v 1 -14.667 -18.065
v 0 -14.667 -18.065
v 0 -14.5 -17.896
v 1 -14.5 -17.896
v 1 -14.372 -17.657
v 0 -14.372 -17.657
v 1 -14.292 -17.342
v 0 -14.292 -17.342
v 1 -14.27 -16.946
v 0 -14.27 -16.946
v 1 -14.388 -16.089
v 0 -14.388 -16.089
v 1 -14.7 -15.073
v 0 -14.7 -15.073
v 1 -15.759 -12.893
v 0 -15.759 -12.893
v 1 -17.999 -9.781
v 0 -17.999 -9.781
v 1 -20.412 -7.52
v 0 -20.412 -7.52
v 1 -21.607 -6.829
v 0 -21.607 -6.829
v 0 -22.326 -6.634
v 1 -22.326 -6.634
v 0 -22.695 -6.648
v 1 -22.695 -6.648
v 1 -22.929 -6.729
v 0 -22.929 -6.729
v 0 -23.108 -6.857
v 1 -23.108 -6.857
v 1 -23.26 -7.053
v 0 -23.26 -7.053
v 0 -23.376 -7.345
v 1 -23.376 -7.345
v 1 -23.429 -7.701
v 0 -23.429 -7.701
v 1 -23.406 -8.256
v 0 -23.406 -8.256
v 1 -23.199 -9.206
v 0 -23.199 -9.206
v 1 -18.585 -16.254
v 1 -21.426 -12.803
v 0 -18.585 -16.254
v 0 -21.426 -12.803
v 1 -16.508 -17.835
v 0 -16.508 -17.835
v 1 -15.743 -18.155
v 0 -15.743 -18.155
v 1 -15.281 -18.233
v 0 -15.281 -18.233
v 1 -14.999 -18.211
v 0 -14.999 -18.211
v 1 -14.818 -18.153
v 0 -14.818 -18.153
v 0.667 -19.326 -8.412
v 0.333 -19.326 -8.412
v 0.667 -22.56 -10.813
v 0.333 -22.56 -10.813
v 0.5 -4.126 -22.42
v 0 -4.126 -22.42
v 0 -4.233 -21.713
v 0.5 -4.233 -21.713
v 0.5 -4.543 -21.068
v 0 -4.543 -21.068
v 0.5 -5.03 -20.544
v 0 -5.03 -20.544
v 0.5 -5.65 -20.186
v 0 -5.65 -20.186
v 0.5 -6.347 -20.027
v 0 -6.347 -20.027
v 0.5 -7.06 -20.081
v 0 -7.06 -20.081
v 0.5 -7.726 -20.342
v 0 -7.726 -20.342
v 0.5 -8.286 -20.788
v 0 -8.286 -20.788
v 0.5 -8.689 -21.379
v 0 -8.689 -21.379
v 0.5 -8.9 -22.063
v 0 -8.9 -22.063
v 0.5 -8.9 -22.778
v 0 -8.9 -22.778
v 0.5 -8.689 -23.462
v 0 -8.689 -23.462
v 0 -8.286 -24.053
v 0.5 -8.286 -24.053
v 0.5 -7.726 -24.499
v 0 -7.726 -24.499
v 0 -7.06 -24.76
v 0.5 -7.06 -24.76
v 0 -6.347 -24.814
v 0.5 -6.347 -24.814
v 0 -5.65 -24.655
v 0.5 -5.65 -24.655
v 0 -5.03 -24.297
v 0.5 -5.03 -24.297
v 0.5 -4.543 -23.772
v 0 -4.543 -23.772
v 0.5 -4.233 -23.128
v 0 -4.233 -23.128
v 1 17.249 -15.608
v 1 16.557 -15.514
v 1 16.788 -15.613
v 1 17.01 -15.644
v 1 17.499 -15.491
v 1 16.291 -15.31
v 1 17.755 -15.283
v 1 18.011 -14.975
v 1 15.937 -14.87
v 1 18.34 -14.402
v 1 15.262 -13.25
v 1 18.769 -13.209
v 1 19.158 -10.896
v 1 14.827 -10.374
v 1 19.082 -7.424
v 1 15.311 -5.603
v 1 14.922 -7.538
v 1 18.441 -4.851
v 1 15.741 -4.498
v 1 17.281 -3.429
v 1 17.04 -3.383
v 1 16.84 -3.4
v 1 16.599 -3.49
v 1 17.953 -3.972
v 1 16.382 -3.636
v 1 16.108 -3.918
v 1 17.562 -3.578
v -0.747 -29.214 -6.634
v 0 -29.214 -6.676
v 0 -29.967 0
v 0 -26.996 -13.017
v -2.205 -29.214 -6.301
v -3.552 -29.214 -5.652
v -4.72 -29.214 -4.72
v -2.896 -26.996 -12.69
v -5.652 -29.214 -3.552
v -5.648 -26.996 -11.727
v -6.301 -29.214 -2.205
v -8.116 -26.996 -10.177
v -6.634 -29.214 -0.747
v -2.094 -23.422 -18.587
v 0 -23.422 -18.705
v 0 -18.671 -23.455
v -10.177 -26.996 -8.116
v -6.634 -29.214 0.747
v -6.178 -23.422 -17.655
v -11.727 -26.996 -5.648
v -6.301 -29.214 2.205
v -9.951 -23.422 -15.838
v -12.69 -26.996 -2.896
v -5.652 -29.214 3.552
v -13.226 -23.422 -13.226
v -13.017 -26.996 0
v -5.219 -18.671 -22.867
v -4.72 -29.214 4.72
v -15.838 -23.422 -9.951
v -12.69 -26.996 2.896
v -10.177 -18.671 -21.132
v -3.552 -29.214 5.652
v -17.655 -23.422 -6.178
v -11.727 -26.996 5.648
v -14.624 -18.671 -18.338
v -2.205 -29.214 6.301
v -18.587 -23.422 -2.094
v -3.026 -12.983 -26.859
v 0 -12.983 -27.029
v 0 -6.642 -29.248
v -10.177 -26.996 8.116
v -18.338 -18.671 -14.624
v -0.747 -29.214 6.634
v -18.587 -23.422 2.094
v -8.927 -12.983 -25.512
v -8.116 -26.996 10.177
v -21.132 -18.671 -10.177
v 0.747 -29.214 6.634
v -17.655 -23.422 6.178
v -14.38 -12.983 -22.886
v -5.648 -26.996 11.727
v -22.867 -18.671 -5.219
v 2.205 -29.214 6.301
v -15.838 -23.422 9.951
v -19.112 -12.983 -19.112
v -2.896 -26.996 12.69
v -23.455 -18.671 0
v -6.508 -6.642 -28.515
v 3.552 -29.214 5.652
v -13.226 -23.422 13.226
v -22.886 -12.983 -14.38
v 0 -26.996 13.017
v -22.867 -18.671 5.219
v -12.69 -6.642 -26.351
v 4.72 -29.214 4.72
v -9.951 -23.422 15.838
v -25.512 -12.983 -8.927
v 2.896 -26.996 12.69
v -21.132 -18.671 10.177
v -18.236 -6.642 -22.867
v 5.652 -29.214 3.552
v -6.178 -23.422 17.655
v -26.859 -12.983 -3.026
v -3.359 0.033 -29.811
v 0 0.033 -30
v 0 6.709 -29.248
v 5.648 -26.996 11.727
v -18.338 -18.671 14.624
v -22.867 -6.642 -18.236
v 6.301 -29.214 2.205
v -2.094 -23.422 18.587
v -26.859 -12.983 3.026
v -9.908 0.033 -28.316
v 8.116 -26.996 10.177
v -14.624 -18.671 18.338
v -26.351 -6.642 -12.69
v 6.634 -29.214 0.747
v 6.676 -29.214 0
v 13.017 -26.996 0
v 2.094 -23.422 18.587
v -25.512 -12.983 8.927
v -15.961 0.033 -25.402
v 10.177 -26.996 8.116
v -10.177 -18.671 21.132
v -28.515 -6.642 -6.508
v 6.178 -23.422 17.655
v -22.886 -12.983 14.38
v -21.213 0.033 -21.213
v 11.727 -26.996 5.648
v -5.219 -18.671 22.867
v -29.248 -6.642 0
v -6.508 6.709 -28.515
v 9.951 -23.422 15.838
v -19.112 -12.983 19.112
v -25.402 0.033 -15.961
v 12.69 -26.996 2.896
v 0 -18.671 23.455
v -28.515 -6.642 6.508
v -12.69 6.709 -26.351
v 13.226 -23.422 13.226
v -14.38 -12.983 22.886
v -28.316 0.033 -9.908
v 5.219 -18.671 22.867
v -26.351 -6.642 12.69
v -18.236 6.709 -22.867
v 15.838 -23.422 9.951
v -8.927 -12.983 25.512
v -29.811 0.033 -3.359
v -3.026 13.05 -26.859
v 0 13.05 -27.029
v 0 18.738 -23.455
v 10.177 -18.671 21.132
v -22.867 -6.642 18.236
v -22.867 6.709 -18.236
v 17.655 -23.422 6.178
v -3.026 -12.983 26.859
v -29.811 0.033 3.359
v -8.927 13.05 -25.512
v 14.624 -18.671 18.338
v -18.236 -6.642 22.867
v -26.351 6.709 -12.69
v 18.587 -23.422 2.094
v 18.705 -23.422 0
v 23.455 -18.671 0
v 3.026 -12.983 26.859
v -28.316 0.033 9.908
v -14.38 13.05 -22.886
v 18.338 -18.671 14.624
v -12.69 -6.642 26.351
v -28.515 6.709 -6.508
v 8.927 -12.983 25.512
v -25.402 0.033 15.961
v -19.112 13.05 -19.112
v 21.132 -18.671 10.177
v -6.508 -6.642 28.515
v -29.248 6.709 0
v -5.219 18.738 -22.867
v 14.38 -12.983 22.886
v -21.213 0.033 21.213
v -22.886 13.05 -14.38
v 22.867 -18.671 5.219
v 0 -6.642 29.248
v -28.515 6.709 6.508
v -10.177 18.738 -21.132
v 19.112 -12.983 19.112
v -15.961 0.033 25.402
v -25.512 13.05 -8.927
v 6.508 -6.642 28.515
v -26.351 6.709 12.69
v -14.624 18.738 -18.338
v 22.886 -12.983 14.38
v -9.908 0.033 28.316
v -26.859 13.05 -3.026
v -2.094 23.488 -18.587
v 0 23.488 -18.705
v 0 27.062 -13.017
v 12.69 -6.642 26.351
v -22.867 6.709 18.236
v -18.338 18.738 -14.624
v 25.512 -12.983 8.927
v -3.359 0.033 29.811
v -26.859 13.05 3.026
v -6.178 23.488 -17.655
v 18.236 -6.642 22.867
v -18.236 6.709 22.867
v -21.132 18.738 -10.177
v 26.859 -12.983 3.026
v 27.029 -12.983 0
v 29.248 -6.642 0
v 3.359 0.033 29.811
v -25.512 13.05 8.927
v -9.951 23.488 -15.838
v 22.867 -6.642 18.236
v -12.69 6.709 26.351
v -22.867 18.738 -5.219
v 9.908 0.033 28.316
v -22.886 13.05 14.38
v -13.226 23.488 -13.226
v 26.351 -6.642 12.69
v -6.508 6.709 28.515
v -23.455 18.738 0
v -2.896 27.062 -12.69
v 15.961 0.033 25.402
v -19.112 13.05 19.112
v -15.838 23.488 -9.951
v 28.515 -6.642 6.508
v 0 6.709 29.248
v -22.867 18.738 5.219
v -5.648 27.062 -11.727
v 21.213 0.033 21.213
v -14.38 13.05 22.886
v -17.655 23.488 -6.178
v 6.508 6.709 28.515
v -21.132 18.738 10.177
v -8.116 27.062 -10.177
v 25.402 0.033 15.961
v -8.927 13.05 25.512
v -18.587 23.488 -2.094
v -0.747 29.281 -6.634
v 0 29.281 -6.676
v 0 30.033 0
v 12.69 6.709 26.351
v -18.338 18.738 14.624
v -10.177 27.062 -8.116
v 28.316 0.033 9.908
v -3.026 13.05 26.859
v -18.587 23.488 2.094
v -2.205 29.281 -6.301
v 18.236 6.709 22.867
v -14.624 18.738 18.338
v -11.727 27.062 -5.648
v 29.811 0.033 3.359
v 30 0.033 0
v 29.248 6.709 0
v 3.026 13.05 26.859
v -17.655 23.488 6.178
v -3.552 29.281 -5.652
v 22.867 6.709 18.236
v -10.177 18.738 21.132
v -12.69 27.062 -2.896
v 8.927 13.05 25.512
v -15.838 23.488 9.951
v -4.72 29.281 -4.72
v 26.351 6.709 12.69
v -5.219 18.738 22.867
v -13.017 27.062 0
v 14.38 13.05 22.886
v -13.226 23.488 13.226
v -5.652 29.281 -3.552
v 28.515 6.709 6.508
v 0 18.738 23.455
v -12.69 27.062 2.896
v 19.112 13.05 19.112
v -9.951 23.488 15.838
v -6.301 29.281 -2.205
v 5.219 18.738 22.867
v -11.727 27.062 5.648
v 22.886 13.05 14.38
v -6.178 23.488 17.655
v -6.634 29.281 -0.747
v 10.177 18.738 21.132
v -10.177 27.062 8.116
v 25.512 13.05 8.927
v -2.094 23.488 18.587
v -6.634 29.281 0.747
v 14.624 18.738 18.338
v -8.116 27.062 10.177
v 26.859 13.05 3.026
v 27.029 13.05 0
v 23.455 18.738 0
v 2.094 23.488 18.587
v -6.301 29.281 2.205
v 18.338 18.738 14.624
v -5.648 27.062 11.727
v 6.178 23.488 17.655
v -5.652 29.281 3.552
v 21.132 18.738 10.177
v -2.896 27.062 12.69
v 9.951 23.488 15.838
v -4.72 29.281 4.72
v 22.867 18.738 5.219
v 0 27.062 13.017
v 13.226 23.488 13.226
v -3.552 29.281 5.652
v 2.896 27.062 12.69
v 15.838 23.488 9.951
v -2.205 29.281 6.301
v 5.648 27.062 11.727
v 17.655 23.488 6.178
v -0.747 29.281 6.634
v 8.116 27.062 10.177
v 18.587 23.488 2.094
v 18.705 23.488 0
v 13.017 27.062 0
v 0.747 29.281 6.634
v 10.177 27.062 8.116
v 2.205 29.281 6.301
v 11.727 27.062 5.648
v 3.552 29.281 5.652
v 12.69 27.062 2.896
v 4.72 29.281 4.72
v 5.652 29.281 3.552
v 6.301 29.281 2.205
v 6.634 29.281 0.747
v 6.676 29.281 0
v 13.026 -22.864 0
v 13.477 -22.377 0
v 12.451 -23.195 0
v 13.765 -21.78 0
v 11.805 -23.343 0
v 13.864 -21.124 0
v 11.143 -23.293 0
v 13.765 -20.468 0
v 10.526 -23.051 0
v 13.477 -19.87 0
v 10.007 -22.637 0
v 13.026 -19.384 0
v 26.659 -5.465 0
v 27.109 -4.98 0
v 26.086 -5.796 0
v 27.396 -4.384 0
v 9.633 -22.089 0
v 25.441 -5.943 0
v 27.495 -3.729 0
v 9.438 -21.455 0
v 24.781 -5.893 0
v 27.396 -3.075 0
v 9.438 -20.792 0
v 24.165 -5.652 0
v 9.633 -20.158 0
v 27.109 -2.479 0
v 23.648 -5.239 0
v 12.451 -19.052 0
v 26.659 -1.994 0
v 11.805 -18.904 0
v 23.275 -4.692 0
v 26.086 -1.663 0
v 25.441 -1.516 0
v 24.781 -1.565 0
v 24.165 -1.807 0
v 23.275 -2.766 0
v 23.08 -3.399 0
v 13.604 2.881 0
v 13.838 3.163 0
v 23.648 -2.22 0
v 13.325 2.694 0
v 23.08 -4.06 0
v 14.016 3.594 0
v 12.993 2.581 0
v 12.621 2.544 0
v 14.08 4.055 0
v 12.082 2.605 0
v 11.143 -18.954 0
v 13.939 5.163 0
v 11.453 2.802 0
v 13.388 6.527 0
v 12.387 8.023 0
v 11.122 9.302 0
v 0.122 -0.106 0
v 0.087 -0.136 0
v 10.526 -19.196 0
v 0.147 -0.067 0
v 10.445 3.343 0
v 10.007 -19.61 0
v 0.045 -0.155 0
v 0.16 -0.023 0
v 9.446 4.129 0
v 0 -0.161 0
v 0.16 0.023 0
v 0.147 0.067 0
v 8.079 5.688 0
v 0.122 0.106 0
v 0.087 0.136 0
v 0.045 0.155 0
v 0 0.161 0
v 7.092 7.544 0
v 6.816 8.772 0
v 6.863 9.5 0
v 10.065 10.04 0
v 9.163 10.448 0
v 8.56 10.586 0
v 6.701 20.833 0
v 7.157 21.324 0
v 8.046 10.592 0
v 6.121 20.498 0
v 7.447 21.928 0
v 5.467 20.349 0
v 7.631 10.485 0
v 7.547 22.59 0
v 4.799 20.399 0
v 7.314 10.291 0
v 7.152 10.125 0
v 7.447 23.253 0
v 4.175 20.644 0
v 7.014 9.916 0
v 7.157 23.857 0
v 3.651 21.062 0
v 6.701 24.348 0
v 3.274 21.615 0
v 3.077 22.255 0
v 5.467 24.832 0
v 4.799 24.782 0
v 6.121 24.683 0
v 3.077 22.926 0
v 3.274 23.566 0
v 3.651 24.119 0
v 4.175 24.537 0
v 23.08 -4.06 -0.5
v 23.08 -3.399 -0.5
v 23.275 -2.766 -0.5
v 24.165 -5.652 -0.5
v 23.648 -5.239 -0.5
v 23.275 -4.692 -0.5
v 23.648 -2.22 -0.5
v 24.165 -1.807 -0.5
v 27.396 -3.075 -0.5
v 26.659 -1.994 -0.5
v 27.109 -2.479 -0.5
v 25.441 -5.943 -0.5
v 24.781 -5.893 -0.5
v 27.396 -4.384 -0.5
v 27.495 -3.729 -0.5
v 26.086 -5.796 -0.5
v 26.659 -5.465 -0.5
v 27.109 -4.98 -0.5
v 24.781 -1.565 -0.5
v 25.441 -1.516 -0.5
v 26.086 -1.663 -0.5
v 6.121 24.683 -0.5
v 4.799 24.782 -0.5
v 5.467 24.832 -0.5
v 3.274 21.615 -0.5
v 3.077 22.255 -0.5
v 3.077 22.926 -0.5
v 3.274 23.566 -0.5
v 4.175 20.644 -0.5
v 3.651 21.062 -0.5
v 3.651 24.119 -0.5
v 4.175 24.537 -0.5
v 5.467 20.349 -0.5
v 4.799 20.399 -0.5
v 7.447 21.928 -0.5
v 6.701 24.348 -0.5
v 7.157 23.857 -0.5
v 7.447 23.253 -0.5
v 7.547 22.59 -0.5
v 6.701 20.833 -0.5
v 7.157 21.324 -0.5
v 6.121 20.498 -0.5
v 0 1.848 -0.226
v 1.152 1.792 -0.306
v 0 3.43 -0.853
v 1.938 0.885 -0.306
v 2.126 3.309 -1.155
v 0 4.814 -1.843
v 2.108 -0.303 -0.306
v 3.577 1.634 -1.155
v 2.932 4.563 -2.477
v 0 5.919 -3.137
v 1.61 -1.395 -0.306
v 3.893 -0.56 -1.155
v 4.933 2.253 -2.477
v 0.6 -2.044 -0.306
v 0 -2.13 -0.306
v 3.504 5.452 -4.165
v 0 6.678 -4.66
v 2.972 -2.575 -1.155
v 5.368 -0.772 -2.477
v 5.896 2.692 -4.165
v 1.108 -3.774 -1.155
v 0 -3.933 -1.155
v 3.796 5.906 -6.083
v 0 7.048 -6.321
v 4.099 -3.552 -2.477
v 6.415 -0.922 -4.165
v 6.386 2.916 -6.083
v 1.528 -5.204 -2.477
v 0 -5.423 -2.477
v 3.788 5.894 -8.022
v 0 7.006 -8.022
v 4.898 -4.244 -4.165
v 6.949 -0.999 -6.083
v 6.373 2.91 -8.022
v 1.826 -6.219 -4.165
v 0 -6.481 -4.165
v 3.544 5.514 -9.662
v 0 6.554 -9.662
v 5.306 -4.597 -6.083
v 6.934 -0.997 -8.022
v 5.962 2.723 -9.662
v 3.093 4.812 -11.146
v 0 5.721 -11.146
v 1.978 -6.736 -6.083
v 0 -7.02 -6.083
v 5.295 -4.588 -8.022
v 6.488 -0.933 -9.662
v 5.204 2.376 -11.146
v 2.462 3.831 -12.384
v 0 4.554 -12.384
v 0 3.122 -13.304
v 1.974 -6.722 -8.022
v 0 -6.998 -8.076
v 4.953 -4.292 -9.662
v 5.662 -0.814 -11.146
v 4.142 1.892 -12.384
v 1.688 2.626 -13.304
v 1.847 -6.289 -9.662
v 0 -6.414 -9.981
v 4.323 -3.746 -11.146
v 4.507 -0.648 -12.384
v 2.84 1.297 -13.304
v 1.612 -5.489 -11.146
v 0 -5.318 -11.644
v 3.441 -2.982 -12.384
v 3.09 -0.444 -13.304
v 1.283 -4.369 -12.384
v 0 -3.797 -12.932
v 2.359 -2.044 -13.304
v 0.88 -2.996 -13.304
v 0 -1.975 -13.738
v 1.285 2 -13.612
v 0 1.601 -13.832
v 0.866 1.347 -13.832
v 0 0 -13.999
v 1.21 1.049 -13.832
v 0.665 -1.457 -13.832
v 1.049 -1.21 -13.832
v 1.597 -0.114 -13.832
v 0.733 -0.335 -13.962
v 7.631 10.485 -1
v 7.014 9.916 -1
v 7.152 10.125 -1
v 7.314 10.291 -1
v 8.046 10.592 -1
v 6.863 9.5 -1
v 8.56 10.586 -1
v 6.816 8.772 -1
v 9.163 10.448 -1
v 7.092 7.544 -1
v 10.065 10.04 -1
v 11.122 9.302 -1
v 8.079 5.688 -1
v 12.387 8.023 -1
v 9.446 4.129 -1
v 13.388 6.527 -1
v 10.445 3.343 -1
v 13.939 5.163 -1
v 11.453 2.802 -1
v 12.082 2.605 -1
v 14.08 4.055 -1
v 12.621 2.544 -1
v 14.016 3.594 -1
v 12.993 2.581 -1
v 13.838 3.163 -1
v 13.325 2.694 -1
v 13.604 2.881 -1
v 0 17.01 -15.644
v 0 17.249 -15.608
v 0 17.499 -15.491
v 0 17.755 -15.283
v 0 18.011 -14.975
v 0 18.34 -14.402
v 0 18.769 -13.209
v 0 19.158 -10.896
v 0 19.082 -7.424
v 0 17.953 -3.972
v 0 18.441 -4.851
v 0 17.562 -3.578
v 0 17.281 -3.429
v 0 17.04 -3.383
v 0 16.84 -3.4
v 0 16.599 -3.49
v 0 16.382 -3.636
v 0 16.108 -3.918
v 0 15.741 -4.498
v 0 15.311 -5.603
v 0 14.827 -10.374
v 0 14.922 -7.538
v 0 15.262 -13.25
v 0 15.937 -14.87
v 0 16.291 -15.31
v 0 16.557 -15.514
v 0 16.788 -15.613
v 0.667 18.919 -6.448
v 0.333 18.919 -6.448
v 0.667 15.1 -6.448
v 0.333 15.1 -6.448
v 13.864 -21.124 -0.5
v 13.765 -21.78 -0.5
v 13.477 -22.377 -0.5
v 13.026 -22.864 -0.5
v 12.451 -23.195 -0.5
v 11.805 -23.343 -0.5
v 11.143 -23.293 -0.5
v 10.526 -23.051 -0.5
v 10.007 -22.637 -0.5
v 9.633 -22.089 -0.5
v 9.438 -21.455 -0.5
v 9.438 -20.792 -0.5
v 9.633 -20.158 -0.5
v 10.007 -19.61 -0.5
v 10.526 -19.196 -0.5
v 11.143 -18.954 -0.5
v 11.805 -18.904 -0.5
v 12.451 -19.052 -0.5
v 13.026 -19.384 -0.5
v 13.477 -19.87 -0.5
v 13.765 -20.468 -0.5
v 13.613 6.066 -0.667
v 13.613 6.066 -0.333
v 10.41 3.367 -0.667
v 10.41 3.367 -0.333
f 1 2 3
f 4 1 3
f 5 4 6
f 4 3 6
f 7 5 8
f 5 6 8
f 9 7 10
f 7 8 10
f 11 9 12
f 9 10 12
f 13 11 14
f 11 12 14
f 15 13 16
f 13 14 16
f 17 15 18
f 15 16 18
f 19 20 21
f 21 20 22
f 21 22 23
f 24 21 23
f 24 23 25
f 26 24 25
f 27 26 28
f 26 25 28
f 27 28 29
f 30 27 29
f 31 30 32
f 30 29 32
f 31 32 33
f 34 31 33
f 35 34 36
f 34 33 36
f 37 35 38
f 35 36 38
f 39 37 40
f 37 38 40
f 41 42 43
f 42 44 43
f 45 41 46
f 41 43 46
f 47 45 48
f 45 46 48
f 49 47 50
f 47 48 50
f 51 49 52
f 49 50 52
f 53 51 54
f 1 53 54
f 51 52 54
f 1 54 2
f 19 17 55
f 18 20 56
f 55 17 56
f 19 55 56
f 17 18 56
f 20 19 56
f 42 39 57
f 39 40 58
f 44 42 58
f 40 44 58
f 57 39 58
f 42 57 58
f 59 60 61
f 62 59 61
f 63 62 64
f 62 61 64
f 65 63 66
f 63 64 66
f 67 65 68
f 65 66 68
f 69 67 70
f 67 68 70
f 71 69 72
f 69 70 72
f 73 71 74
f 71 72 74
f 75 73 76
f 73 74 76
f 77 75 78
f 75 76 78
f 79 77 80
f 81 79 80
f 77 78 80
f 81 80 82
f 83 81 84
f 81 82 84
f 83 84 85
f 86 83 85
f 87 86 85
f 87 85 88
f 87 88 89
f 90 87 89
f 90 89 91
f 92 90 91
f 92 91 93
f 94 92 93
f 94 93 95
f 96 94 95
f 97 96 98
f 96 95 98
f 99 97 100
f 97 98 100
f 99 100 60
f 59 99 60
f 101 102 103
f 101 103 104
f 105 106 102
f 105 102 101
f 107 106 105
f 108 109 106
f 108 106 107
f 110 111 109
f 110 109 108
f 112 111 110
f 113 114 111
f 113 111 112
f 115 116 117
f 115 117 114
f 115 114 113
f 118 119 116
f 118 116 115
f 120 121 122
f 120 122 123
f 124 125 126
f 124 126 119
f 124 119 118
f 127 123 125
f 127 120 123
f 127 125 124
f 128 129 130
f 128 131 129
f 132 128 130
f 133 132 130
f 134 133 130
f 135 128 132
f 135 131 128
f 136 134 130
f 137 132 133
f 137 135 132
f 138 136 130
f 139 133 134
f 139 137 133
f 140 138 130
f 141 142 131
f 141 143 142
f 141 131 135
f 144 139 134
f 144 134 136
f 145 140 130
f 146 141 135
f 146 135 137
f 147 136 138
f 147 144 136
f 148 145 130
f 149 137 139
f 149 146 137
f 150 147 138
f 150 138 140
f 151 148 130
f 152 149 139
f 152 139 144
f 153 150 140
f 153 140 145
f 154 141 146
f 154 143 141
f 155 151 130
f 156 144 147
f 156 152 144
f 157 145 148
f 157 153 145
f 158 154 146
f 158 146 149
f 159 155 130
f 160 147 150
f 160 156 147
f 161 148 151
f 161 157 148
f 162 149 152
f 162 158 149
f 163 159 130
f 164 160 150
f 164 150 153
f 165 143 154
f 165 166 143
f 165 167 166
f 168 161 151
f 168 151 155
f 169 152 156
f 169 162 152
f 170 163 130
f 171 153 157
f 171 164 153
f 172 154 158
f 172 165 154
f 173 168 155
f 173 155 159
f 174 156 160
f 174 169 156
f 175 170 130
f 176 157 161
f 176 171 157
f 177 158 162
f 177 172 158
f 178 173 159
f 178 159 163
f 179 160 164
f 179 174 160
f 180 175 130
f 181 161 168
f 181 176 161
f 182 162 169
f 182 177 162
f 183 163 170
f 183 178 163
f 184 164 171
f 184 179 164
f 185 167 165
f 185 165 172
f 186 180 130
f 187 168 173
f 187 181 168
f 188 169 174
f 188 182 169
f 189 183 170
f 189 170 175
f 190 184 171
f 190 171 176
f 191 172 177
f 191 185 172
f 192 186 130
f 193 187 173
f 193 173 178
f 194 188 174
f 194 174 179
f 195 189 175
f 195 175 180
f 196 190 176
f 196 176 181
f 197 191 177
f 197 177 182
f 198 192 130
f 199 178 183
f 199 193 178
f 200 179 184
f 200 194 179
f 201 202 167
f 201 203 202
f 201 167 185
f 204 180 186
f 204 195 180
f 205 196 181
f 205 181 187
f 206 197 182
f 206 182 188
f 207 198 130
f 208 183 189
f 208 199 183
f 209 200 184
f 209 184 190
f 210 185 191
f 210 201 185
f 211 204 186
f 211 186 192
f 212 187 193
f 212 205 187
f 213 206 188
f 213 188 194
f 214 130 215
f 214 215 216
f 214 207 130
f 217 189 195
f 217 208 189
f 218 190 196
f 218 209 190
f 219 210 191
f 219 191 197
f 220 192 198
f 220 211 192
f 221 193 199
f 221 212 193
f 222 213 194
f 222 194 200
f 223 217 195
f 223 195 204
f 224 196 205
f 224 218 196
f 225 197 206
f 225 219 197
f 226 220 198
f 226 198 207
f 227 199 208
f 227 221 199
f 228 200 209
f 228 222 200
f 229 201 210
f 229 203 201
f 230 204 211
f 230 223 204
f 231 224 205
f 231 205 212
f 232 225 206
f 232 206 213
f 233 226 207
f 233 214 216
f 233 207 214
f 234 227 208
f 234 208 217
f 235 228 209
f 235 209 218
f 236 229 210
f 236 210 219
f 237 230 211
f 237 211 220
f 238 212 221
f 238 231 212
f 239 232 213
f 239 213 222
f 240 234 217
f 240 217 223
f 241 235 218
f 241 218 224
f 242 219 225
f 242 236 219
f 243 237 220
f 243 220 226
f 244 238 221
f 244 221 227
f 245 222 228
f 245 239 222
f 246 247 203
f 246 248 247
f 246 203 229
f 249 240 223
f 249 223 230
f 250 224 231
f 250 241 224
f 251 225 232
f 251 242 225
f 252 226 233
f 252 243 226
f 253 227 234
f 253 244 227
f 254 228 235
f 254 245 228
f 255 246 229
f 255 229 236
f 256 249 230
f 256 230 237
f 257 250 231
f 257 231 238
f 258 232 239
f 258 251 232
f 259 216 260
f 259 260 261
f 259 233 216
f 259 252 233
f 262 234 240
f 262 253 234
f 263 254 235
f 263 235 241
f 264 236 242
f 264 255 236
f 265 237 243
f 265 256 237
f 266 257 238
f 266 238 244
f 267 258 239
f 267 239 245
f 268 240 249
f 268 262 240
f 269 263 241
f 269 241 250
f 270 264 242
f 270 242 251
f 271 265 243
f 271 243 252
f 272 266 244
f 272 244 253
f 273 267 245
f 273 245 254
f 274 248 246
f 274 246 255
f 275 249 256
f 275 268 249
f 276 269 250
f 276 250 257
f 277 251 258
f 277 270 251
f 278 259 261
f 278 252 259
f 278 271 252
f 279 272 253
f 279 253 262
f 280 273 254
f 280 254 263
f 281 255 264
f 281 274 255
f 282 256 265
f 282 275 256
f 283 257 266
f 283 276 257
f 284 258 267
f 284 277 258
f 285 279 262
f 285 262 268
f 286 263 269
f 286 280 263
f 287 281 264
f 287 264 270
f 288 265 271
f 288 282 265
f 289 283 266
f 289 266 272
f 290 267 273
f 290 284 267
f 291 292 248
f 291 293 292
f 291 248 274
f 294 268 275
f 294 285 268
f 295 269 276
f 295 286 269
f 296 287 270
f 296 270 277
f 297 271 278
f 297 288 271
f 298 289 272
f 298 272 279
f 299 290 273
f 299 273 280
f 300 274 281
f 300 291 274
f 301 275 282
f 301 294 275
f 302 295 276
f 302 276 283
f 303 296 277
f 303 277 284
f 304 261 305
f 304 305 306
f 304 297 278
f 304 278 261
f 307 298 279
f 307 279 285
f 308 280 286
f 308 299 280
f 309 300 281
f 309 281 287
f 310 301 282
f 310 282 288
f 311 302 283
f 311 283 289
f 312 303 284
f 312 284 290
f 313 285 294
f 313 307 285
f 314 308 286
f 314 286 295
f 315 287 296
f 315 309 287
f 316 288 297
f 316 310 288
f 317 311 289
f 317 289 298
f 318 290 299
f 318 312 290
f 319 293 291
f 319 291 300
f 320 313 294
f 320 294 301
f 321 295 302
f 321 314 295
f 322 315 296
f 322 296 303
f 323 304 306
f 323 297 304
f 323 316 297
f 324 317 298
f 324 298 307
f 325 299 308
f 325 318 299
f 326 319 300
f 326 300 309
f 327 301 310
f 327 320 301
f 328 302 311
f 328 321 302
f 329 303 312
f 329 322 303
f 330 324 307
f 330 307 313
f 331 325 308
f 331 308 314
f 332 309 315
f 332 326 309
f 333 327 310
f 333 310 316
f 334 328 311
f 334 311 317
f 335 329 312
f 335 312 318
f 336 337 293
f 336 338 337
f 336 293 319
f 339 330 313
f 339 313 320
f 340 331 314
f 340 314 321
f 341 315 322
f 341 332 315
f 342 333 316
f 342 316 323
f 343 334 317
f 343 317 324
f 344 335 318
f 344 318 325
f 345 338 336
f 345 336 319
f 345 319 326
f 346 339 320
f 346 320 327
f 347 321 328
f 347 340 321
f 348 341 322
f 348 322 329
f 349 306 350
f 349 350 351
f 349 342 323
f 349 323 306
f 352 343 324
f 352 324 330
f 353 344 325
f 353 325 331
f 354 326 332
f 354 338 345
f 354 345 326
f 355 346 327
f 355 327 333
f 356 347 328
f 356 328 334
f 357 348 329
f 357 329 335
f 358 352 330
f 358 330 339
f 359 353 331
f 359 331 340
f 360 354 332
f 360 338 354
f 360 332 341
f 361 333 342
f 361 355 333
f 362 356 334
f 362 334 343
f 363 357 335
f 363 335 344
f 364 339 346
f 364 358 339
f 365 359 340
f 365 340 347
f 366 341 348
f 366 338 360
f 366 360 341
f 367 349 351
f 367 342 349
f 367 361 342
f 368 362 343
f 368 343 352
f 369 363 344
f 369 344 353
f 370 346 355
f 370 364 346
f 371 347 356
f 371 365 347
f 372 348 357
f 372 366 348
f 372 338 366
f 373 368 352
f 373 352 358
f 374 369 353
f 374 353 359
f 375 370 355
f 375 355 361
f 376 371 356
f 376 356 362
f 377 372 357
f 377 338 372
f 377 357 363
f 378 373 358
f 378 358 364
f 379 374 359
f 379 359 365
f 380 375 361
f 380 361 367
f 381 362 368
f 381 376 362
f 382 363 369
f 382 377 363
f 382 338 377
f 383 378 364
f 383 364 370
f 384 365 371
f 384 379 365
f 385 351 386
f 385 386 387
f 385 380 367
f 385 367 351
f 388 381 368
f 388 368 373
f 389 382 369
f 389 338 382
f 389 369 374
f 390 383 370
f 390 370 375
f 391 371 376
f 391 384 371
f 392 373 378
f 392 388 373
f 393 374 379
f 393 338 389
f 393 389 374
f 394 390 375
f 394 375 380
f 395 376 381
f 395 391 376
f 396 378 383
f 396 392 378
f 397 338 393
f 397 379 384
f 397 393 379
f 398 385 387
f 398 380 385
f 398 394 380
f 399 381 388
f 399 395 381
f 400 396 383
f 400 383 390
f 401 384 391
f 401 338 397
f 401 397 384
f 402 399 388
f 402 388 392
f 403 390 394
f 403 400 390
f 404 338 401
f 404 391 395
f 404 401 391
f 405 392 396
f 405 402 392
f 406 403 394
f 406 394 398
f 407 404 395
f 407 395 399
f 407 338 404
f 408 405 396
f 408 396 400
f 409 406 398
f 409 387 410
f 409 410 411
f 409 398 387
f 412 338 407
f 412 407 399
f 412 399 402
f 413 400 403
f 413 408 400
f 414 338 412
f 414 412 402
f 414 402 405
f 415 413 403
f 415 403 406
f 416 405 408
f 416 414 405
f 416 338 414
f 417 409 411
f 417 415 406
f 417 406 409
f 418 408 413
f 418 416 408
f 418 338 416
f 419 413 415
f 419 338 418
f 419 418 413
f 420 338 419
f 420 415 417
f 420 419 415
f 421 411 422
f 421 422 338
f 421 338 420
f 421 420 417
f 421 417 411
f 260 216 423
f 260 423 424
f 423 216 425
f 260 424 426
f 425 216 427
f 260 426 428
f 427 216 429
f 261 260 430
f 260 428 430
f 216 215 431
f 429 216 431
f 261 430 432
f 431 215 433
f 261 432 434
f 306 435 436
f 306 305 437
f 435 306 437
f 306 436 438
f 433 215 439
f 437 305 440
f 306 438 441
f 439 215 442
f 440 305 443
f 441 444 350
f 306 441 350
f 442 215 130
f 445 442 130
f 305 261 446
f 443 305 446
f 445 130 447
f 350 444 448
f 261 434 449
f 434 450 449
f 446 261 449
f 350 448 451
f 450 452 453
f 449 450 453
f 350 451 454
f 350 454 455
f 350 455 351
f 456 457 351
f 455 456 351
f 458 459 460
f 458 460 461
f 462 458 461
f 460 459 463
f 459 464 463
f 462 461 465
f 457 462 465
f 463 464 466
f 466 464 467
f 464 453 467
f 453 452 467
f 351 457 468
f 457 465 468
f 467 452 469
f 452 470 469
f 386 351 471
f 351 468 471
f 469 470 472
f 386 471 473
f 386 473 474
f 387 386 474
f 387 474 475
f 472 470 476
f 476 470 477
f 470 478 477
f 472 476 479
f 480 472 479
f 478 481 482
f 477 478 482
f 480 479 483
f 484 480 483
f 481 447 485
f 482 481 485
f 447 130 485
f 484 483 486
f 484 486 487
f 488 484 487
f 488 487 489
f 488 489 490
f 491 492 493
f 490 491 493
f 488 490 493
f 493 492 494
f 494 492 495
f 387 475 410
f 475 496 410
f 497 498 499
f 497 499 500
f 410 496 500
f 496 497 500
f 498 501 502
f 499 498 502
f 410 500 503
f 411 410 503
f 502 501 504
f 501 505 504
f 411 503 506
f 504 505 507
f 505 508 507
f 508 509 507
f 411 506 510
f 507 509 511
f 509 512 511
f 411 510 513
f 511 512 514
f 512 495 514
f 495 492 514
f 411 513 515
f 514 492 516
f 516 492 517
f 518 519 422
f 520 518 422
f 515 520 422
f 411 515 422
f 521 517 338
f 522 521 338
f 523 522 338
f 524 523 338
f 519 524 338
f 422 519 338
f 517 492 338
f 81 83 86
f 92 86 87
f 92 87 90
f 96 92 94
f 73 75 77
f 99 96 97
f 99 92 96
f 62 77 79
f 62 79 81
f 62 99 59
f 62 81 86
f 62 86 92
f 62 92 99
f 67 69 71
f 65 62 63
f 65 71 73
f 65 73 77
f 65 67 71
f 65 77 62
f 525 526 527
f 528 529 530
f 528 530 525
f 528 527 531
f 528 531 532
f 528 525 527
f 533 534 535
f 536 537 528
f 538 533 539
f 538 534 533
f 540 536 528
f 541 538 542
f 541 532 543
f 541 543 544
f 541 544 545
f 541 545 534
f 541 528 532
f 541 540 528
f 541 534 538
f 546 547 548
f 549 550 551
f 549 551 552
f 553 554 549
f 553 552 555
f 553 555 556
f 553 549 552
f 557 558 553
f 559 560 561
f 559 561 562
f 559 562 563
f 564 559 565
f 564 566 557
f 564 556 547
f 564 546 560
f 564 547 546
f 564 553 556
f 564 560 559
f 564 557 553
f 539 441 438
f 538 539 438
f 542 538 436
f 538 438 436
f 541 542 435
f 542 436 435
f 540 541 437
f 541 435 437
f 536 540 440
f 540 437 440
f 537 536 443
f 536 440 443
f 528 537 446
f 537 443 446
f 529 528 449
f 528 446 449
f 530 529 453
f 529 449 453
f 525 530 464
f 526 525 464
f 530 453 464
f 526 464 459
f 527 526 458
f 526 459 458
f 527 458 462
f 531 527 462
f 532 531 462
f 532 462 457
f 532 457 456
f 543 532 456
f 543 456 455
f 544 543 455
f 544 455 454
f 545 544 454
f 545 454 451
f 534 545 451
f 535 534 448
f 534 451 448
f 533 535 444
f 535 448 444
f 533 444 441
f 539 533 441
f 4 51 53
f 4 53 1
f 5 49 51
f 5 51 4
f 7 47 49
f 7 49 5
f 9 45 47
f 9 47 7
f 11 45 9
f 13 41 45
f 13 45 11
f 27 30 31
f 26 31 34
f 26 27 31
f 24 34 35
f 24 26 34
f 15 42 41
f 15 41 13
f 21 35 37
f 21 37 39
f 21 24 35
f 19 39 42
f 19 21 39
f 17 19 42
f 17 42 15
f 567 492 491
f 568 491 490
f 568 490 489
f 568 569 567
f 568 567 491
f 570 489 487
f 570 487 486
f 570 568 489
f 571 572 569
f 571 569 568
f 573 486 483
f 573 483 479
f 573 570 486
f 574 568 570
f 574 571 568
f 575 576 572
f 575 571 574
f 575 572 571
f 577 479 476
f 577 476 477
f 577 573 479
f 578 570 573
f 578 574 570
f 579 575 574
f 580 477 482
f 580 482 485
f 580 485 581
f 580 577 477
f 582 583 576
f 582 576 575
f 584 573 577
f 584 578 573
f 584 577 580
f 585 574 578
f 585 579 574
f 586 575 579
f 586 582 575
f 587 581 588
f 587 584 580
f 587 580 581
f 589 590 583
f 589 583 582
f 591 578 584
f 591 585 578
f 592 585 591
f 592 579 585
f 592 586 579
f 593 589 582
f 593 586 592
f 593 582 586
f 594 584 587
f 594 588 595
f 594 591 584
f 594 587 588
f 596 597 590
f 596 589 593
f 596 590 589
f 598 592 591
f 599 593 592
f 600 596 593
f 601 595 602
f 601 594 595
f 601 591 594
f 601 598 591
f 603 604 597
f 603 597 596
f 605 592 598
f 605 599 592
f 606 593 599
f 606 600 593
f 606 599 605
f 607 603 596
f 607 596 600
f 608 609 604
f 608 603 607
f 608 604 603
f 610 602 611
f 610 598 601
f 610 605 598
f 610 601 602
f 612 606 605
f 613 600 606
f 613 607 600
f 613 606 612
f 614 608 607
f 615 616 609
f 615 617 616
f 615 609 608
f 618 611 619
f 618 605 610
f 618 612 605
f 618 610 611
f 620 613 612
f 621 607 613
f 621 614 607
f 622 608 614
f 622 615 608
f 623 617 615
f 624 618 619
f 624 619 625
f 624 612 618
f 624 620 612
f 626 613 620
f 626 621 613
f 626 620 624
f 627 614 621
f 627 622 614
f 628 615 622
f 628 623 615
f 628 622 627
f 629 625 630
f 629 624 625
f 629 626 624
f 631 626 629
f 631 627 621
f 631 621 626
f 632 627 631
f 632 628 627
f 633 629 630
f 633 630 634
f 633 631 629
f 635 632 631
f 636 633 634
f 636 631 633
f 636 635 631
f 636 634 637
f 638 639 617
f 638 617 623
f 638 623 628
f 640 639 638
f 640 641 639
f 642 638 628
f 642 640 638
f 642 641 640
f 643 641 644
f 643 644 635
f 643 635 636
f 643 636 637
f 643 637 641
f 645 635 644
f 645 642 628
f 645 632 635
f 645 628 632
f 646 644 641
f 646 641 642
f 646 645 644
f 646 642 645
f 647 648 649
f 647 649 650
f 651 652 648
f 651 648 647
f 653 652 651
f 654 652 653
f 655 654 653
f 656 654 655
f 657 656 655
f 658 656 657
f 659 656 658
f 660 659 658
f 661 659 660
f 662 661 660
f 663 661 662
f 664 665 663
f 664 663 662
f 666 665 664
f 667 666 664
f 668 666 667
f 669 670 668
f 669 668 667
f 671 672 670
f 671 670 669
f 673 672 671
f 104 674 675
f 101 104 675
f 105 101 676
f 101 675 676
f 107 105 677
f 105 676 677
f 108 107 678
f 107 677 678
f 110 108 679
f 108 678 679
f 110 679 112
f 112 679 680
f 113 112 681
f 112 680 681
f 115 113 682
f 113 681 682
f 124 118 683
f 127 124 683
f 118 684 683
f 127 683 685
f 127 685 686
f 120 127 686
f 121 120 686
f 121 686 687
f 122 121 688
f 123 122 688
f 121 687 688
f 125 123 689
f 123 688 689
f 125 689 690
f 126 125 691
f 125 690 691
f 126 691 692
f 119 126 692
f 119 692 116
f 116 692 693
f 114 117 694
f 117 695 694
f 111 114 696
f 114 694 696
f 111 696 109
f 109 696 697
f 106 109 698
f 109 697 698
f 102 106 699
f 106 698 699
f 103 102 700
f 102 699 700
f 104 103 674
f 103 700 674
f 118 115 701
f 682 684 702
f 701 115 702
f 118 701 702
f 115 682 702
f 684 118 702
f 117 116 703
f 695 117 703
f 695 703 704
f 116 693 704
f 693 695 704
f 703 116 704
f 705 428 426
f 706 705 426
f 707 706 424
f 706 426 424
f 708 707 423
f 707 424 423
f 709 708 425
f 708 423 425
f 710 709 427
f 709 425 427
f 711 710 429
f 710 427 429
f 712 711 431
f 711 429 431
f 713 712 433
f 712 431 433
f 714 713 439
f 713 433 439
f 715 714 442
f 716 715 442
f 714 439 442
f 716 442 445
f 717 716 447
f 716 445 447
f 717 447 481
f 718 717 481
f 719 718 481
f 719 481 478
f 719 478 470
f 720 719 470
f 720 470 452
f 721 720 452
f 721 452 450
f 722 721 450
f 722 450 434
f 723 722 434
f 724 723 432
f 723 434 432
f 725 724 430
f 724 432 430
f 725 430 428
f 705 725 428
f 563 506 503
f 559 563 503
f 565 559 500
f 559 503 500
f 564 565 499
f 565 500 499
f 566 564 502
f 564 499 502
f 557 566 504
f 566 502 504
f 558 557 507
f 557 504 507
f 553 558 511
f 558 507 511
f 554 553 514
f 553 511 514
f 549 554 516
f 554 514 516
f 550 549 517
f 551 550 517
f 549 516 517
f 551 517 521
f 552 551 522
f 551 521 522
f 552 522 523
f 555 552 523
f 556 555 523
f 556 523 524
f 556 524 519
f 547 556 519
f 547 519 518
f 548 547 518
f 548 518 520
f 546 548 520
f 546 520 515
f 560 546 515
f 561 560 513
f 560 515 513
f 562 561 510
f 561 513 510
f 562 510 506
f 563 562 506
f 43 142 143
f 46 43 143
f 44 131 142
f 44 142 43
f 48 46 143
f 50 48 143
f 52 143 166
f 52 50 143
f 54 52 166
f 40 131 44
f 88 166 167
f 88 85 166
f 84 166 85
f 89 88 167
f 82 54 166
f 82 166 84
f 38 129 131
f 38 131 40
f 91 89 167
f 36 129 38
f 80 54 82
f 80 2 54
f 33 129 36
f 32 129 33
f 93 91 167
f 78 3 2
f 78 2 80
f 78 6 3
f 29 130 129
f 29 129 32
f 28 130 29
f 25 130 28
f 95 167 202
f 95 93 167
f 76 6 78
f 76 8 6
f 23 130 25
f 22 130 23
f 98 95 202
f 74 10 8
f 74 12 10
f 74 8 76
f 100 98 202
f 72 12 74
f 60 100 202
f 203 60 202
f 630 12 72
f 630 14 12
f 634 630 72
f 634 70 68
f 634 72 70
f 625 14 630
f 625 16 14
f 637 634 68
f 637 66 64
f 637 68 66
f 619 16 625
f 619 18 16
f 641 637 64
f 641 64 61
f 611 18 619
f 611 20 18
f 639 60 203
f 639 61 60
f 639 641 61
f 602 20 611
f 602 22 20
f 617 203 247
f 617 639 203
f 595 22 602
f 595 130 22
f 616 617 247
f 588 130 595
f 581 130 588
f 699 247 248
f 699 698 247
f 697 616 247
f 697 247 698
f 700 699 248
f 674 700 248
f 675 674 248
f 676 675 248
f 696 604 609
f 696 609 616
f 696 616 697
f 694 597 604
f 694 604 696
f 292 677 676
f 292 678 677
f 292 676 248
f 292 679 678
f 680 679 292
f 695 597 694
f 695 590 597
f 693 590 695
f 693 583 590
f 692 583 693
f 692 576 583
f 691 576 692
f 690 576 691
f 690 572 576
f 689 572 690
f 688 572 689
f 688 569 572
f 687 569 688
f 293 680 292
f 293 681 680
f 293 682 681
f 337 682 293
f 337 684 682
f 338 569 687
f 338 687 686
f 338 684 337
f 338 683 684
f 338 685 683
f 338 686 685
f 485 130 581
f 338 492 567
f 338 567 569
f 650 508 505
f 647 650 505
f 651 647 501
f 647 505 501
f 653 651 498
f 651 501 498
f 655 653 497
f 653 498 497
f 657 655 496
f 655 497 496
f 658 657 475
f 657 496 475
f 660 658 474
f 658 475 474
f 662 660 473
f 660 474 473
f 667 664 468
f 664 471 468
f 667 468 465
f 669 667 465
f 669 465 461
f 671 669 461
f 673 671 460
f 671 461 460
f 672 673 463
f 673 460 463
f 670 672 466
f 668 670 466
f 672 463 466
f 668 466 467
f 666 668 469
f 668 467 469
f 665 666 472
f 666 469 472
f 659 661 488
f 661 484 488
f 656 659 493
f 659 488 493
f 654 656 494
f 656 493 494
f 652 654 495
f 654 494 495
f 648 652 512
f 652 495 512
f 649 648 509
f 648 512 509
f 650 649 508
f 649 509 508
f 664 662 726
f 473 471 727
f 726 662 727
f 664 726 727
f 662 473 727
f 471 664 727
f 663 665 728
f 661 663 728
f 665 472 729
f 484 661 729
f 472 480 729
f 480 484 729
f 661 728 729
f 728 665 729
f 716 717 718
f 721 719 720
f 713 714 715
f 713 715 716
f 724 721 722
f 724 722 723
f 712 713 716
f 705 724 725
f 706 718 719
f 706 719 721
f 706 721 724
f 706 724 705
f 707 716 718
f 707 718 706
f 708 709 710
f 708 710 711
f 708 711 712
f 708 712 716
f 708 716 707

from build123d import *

# Parameters (mm, degrees)
F1_ANGLE  = 270
F5_DEPTH  = 1
F7_DEPTH  = 1
F8_R      = 2.3999784267
F9_DEPTH  = 0.5
F10_R     = 2.2479266401
F11_DEPTH = 0.5
F12_R     = 2.219715214
F13_DEPTH = 0.5
F14_R     = 2.225517588
F15_DEPTH = 0.5
F21_DEPTH = 1


# Not quite as in the source:
# - the program builds the solid bodies; features that only make, move or delete a surface that nothing else refers to are left out


with BuildPart() as f1:
    # F0 (on Right) → F1 (revolve)
    with BuildSketch(Plane.YZ):
        with BuildLine():
            Line((30.0334315861, 0), (-29.9665684139, 0))
            ThreePointArc((-29.9665684139, 0), (0.0334315861, -30), (30.0334315861, 0))
        make_face()
    revolve(axis=Axis((0, 0.0334315861, 0), (0, 1, 0)), revolution_arc=F1_ANGLE)

    # F2 (on face) → F3 (revolve)
    with BuildSketch(Plane.YZ):
        with BuildLine():
            Line((0, -13.9990693861), (0, 0))
            Line((0, 0), (-0.1614197102, 0))
            ThreePointArc((-0.1614197102, 0), (-7.0802445482, -7.0802445482), (0, -13.9990693861))
        make_face()
        with BuildLine():
            Line((0, -13.9990693861), (0, 0))
            ThreePointArc((0, 0), (-7.0807098551, -6.9995346931), (0, -13.9990693861))
        make_face()
    revolve(axis=Axis((0, 0, -6.9995346931), (0, 0, -1)))

    # F4 (on Right) → F5 (join)
    with BuildSketch(Plane.YZ):
        with BuildLine():
            add(Edge.make_bspline(
                [(17.0095134526, -15.6440958381), (20.8283990638, -15.6440958381), (18.9189562582, -6.4476504922), (17.0095134526, 2.7487948537), (15.1000706471, -6.4476504922), (13.1906278415, -15.6440958381), (17.0095134526, -15.6440958381)],
                knots=[0, 0, 0, 2.0943951024, 2.0943951024, 4.1887902048, 4.1887902048, 6.2831853072, 6.2831853072, 6.2831853072], degree=2, weights=[1, 0.5, 1, 0.5, 1, 0.5, 1]))
        make_face()
    extrude(amount=F5_DEPTH)

    # F6 (on Right) → F7 (join)
    with BuildSketch(Plane.YZ):
        with BuildLine():
            add(Edge.make_bspline(
                [(-14.6672427654, -18.0654972792), (-11.4328069704, -15.6641534543), (-19.325768114, -8.4118548322), (-27.2187292576, -1.15955621), (-22.560203909, -10.8131986571), (-17.9016785604, -20.4668411041), (-14.6672427654, -18.0654972792)],
                knots=[0, 0, 0, 2.0943951024, 2.0943951024, 4.1887902048, 4.1887902048, 6.2831853072, 6.2831853072, 6.2831853072], degree=2, weights=[1, 0.5, 1, 0.5, 1, 0.5, 1]))
        make_face()
    extrude(amount=F7_DEPTH)

    # F8 (on face) → F9 (join)
    with BuildSketch(Plane.YZ):
        with Locations((-6.5264105797, -22.420451045)):
            Circle(F8_R)
    extrude(amount=F9_DEPTH)

    # F10 (on face) → F11 (join)
    with BuildSketch(Plane(origin=(0, 0, 0), x_dir=(1, 0, 0), z_dir=(0, 0, -1))):
        with Locations((5.2993446589, -22.5904844701)):
            Circle(F10_R)
    extrude(amount=F11_DEPTH)

    # F12 (on face) → F13 (join)
    with BuildSketch(Plane(origin=(0, 0, 0), x_dir=(1, 0, 0), z_dir=(0, 0, -1))):
        with Locations((25.2750441432, 3.729365766)):
            Circle(F12_R)
    extrude(amount=F13_DEPTH)

    # F14 (on face) → F15 (join)
    with BuildSketch(Plane(origin=(0, 0, 0), x_dir=(1, 0, 0), z_dir=(0, 0, -1))):
        with Locations((11.6383302957, 21.1235657334)):
            Circle(F14_R)
    extrude(amount=F15_DEPTH)

    # F20 (on face) → F21 (join)
    with BuildSketch(Plane(origin=(0, 0, 0), x_dir=(1, 0, 0), z_dir=(0, 0, -1))):
        with BuildLine():
            add(Edge.make_bspline(
                [(7.3144584894, -10.2911405265), (10.5177671604, -12.9900925853), (13.6132754829, -6.0656891234), (16.7087838054, 0.8587143384), (10.4099668119, -3.3667370647), (4.1111498184, -7.5921884678), (7.3144584894, -10.2911405265)],
                knots=[0, 0, 0, 2.0943951024, 2.0943951024, 4.1887902048, 4.1887902048, 6.2831853072, 6.2831853072, 6.2831853072], degree=2, weights=[1, 0.5, 1, 0.5, 1, 0.5, 1]))
        make_face()
    extrude(amount=F21_DEPTH)


solid = f1.part
